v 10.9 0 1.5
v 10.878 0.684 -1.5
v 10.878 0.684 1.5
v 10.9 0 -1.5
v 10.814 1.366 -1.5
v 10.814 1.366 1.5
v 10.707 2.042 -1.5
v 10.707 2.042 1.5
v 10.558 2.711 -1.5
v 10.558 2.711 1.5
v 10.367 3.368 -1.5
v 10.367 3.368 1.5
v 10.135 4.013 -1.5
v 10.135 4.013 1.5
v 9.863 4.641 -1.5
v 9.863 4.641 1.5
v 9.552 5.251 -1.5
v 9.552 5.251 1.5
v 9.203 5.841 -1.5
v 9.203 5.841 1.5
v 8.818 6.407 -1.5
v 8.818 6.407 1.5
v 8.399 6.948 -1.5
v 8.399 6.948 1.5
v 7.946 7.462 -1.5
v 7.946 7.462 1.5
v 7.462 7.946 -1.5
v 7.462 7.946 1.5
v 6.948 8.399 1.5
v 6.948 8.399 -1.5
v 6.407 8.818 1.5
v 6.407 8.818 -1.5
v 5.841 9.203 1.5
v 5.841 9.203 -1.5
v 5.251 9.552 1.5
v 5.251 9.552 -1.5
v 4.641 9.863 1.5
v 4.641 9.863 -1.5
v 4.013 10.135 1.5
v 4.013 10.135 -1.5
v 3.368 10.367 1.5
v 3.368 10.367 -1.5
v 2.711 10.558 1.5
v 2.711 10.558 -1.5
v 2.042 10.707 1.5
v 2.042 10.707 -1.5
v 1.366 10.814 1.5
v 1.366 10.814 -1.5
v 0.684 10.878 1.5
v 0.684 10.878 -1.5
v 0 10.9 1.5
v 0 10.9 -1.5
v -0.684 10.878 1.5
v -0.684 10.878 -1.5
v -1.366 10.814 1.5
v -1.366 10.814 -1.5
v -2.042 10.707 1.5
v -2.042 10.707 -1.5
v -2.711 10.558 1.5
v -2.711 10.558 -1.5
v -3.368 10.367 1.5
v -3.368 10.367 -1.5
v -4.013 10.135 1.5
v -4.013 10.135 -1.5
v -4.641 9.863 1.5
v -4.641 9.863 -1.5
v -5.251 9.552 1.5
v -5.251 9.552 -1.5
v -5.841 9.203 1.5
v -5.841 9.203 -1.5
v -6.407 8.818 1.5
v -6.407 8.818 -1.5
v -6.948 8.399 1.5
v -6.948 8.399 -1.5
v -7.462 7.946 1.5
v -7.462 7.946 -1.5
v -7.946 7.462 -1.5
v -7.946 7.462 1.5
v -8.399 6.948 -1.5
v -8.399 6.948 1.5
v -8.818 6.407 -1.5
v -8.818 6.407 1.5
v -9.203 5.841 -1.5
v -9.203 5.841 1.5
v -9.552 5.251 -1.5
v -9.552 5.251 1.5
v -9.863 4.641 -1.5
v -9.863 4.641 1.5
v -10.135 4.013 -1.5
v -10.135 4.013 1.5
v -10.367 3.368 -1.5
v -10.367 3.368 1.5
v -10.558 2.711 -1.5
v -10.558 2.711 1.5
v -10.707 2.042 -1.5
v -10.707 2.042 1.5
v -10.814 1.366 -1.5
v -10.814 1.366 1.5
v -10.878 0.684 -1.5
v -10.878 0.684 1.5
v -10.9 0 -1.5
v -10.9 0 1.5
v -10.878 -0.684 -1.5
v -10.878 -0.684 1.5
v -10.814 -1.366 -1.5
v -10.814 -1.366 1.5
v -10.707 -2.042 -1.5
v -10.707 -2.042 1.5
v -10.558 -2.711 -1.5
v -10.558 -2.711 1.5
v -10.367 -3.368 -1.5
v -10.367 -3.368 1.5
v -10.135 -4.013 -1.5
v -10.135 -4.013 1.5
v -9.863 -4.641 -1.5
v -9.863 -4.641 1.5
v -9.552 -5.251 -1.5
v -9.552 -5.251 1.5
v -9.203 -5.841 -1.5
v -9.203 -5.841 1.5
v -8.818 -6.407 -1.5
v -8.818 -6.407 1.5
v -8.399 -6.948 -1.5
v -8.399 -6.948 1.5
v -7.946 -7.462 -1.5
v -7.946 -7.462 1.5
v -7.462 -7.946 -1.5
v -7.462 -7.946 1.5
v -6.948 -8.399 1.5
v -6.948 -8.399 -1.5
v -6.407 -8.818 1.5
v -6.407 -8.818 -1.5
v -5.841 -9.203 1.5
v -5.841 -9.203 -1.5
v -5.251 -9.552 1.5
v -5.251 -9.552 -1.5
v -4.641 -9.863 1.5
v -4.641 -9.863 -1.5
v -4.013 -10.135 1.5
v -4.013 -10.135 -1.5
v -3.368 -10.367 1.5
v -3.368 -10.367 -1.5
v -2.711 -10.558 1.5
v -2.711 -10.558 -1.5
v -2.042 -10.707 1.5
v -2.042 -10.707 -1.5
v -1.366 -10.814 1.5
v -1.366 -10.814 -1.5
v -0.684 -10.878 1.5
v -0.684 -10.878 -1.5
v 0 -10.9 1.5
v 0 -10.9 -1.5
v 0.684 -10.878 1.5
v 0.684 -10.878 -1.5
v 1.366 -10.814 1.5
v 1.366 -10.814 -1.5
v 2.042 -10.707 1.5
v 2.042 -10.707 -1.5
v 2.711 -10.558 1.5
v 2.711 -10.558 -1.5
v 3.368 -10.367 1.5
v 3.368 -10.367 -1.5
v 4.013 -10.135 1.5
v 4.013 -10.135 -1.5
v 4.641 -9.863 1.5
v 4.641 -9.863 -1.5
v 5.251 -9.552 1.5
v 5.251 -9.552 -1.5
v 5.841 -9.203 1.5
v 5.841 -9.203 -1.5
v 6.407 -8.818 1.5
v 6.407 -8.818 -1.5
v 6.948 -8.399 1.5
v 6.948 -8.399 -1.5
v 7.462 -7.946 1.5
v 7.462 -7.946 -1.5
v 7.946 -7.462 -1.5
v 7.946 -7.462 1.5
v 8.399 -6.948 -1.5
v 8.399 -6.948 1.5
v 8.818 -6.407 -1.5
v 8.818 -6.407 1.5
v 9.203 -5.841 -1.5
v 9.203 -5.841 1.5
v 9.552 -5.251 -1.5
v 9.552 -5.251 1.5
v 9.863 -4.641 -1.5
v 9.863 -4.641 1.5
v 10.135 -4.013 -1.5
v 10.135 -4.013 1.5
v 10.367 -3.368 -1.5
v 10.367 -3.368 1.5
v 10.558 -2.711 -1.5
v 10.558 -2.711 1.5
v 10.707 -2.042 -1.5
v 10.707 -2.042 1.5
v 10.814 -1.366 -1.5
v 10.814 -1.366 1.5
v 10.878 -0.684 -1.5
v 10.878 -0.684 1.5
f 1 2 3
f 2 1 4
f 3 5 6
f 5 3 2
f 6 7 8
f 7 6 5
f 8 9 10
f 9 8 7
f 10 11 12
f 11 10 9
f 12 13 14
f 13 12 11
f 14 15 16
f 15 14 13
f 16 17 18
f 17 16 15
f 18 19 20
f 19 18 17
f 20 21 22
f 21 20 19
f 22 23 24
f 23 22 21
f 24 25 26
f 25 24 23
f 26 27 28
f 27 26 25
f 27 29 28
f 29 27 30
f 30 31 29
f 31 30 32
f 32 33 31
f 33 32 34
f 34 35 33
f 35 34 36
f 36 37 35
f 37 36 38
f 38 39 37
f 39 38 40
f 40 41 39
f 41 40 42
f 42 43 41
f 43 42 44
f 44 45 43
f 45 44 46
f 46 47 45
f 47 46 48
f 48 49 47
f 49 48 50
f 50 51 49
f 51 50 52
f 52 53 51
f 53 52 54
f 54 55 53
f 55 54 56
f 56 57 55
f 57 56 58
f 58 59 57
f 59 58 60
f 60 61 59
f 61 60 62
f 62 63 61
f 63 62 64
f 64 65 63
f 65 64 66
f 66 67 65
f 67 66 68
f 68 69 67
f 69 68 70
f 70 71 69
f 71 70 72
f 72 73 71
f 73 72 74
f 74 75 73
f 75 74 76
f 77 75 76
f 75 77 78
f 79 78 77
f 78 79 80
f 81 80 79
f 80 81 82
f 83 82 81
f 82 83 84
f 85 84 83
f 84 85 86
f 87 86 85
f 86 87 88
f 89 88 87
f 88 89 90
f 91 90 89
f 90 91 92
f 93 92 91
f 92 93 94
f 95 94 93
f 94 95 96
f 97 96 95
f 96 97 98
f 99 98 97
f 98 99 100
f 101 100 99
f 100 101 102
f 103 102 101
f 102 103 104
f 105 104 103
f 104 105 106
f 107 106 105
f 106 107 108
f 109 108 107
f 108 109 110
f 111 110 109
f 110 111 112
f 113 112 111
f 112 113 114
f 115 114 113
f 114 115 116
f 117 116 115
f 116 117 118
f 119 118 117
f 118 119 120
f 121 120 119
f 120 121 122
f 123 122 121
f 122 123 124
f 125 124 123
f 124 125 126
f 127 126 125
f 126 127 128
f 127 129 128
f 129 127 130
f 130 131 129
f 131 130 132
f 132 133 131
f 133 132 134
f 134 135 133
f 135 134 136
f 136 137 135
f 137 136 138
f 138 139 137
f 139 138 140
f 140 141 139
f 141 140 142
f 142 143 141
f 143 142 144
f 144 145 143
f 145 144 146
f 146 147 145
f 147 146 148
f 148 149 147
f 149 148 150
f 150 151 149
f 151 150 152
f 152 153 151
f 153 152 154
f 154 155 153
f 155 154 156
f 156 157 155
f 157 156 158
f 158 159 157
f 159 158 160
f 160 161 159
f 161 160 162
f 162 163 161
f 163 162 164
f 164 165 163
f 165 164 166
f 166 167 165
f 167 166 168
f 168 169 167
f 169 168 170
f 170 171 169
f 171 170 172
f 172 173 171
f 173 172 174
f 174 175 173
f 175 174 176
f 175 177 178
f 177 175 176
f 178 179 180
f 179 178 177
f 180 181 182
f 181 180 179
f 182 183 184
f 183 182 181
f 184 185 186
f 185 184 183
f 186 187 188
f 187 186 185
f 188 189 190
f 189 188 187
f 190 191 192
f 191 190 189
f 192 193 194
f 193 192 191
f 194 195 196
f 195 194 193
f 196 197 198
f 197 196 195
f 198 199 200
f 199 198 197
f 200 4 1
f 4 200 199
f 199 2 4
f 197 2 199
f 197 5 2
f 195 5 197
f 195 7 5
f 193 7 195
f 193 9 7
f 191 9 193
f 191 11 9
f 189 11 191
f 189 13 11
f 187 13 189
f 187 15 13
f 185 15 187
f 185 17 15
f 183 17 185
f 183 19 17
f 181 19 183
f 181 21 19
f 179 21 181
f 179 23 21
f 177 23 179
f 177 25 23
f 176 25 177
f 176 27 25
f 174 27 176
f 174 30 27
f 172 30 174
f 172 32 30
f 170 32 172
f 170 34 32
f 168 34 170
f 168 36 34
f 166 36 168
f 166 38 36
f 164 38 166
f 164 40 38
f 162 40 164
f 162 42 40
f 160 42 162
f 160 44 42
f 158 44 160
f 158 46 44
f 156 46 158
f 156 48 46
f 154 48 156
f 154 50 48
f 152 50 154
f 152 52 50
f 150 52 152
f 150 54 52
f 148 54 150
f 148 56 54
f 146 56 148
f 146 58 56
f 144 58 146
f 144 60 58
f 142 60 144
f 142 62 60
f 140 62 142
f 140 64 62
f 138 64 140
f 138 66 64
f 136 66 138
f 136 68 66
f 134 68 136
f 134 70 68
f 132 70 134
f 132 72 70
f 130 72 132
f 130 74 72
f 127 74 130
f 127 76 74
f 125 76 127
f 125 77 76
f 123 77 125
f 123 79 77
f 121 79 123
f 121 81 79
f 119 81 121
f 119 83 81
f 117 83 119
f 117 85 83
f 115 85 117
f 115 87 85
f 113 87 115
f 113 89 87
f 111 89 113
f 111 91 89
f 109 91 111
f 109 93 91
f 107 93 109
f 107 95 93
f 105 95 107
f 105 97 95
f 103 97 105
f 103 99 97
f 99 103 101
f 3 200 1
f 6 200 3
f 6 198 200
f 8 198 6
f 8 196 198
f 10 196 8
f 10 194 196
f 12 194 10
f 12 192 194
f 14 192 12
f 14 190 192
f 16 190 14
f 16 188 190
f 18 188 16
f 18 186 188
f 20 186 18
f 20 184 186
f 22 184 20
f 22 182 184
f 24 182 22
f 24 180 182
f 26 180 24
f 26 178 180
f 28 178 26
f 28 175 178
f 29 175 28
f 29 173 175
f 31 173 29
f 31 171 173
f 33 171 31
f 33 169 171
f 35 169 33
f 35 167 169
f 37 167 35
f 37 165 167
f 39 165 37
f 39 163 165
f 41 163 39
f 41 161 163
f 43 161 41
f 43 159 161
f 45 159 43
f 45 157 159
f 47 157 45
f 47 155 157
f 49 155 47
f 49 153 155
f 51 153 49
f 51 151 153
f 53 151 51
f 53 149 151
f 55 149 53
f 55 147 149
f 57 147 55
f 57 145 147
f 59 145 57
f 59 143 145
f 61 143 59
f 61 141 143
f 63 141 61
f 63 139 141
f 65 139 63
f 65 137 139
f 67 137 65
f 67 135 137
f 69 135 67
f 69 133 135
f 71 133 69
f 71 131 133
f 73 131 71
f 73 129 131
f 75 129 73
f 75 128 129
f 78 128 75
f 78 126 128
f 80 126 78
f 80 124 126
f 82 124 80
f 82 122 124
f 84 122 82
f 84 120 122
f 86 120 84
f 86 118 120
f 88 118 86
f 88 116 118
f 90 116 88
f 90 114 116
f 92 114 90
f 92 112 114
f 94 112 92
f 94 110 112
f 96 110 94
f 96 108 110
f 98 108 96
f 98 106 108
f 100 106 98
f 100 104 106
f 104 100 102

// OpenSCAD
disk();

module disk(height = 3, radius = 10.9)
{
    cylinder (h = height, r=radius, center = true, $fn=100);    
}
